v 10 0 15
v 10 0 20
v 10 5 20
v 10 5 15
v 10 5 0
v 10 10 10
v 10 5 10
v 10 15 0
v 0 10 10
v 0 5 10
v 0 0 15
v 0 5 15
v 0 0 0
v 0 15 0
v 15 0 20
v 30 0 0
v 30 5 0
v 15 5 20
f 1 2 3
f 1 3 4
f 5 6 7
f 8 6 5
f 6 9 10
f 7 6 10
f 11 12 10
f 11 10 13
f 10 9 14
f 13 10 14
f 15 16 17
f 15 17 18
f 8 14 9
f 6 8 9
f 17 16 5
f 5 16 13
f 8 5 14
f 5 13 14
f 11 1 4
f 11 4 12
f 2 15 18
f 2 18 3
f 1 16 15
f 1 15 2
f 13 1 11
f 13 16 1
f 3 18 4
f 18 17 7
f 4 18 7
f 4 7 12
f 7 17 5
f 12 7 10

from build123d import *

# Parameters (mm, degrees)
EXTRUDE_1_DEPTH = 5
EXTRUDE_2_DEPTH = 10


with BuildPart() as part:
    # 草圖1 → 填料-伸長1 (new body)
    with BuildSketch(Plane(origin=(0, 0, 0), x_dir=(1, 0, 0), z_dir=(0, 1, 0))):
        Polygon((0, 0), (30, 0), (15, -20), (10, -20), (10, -15), (0, -15), align=None)
    extrude(amount=EXTRUDE_1_DEPTH)

    # 草圖2 → 填料-伸長2 (add)
    with BuildSketch(Plane.ZY):
        Polygon((0, 5), (0, 15), (10, 10), (10, 5), align=None)
    extrude(amount=-EXTRUDE_2_DEPTH)


solid = part.part
